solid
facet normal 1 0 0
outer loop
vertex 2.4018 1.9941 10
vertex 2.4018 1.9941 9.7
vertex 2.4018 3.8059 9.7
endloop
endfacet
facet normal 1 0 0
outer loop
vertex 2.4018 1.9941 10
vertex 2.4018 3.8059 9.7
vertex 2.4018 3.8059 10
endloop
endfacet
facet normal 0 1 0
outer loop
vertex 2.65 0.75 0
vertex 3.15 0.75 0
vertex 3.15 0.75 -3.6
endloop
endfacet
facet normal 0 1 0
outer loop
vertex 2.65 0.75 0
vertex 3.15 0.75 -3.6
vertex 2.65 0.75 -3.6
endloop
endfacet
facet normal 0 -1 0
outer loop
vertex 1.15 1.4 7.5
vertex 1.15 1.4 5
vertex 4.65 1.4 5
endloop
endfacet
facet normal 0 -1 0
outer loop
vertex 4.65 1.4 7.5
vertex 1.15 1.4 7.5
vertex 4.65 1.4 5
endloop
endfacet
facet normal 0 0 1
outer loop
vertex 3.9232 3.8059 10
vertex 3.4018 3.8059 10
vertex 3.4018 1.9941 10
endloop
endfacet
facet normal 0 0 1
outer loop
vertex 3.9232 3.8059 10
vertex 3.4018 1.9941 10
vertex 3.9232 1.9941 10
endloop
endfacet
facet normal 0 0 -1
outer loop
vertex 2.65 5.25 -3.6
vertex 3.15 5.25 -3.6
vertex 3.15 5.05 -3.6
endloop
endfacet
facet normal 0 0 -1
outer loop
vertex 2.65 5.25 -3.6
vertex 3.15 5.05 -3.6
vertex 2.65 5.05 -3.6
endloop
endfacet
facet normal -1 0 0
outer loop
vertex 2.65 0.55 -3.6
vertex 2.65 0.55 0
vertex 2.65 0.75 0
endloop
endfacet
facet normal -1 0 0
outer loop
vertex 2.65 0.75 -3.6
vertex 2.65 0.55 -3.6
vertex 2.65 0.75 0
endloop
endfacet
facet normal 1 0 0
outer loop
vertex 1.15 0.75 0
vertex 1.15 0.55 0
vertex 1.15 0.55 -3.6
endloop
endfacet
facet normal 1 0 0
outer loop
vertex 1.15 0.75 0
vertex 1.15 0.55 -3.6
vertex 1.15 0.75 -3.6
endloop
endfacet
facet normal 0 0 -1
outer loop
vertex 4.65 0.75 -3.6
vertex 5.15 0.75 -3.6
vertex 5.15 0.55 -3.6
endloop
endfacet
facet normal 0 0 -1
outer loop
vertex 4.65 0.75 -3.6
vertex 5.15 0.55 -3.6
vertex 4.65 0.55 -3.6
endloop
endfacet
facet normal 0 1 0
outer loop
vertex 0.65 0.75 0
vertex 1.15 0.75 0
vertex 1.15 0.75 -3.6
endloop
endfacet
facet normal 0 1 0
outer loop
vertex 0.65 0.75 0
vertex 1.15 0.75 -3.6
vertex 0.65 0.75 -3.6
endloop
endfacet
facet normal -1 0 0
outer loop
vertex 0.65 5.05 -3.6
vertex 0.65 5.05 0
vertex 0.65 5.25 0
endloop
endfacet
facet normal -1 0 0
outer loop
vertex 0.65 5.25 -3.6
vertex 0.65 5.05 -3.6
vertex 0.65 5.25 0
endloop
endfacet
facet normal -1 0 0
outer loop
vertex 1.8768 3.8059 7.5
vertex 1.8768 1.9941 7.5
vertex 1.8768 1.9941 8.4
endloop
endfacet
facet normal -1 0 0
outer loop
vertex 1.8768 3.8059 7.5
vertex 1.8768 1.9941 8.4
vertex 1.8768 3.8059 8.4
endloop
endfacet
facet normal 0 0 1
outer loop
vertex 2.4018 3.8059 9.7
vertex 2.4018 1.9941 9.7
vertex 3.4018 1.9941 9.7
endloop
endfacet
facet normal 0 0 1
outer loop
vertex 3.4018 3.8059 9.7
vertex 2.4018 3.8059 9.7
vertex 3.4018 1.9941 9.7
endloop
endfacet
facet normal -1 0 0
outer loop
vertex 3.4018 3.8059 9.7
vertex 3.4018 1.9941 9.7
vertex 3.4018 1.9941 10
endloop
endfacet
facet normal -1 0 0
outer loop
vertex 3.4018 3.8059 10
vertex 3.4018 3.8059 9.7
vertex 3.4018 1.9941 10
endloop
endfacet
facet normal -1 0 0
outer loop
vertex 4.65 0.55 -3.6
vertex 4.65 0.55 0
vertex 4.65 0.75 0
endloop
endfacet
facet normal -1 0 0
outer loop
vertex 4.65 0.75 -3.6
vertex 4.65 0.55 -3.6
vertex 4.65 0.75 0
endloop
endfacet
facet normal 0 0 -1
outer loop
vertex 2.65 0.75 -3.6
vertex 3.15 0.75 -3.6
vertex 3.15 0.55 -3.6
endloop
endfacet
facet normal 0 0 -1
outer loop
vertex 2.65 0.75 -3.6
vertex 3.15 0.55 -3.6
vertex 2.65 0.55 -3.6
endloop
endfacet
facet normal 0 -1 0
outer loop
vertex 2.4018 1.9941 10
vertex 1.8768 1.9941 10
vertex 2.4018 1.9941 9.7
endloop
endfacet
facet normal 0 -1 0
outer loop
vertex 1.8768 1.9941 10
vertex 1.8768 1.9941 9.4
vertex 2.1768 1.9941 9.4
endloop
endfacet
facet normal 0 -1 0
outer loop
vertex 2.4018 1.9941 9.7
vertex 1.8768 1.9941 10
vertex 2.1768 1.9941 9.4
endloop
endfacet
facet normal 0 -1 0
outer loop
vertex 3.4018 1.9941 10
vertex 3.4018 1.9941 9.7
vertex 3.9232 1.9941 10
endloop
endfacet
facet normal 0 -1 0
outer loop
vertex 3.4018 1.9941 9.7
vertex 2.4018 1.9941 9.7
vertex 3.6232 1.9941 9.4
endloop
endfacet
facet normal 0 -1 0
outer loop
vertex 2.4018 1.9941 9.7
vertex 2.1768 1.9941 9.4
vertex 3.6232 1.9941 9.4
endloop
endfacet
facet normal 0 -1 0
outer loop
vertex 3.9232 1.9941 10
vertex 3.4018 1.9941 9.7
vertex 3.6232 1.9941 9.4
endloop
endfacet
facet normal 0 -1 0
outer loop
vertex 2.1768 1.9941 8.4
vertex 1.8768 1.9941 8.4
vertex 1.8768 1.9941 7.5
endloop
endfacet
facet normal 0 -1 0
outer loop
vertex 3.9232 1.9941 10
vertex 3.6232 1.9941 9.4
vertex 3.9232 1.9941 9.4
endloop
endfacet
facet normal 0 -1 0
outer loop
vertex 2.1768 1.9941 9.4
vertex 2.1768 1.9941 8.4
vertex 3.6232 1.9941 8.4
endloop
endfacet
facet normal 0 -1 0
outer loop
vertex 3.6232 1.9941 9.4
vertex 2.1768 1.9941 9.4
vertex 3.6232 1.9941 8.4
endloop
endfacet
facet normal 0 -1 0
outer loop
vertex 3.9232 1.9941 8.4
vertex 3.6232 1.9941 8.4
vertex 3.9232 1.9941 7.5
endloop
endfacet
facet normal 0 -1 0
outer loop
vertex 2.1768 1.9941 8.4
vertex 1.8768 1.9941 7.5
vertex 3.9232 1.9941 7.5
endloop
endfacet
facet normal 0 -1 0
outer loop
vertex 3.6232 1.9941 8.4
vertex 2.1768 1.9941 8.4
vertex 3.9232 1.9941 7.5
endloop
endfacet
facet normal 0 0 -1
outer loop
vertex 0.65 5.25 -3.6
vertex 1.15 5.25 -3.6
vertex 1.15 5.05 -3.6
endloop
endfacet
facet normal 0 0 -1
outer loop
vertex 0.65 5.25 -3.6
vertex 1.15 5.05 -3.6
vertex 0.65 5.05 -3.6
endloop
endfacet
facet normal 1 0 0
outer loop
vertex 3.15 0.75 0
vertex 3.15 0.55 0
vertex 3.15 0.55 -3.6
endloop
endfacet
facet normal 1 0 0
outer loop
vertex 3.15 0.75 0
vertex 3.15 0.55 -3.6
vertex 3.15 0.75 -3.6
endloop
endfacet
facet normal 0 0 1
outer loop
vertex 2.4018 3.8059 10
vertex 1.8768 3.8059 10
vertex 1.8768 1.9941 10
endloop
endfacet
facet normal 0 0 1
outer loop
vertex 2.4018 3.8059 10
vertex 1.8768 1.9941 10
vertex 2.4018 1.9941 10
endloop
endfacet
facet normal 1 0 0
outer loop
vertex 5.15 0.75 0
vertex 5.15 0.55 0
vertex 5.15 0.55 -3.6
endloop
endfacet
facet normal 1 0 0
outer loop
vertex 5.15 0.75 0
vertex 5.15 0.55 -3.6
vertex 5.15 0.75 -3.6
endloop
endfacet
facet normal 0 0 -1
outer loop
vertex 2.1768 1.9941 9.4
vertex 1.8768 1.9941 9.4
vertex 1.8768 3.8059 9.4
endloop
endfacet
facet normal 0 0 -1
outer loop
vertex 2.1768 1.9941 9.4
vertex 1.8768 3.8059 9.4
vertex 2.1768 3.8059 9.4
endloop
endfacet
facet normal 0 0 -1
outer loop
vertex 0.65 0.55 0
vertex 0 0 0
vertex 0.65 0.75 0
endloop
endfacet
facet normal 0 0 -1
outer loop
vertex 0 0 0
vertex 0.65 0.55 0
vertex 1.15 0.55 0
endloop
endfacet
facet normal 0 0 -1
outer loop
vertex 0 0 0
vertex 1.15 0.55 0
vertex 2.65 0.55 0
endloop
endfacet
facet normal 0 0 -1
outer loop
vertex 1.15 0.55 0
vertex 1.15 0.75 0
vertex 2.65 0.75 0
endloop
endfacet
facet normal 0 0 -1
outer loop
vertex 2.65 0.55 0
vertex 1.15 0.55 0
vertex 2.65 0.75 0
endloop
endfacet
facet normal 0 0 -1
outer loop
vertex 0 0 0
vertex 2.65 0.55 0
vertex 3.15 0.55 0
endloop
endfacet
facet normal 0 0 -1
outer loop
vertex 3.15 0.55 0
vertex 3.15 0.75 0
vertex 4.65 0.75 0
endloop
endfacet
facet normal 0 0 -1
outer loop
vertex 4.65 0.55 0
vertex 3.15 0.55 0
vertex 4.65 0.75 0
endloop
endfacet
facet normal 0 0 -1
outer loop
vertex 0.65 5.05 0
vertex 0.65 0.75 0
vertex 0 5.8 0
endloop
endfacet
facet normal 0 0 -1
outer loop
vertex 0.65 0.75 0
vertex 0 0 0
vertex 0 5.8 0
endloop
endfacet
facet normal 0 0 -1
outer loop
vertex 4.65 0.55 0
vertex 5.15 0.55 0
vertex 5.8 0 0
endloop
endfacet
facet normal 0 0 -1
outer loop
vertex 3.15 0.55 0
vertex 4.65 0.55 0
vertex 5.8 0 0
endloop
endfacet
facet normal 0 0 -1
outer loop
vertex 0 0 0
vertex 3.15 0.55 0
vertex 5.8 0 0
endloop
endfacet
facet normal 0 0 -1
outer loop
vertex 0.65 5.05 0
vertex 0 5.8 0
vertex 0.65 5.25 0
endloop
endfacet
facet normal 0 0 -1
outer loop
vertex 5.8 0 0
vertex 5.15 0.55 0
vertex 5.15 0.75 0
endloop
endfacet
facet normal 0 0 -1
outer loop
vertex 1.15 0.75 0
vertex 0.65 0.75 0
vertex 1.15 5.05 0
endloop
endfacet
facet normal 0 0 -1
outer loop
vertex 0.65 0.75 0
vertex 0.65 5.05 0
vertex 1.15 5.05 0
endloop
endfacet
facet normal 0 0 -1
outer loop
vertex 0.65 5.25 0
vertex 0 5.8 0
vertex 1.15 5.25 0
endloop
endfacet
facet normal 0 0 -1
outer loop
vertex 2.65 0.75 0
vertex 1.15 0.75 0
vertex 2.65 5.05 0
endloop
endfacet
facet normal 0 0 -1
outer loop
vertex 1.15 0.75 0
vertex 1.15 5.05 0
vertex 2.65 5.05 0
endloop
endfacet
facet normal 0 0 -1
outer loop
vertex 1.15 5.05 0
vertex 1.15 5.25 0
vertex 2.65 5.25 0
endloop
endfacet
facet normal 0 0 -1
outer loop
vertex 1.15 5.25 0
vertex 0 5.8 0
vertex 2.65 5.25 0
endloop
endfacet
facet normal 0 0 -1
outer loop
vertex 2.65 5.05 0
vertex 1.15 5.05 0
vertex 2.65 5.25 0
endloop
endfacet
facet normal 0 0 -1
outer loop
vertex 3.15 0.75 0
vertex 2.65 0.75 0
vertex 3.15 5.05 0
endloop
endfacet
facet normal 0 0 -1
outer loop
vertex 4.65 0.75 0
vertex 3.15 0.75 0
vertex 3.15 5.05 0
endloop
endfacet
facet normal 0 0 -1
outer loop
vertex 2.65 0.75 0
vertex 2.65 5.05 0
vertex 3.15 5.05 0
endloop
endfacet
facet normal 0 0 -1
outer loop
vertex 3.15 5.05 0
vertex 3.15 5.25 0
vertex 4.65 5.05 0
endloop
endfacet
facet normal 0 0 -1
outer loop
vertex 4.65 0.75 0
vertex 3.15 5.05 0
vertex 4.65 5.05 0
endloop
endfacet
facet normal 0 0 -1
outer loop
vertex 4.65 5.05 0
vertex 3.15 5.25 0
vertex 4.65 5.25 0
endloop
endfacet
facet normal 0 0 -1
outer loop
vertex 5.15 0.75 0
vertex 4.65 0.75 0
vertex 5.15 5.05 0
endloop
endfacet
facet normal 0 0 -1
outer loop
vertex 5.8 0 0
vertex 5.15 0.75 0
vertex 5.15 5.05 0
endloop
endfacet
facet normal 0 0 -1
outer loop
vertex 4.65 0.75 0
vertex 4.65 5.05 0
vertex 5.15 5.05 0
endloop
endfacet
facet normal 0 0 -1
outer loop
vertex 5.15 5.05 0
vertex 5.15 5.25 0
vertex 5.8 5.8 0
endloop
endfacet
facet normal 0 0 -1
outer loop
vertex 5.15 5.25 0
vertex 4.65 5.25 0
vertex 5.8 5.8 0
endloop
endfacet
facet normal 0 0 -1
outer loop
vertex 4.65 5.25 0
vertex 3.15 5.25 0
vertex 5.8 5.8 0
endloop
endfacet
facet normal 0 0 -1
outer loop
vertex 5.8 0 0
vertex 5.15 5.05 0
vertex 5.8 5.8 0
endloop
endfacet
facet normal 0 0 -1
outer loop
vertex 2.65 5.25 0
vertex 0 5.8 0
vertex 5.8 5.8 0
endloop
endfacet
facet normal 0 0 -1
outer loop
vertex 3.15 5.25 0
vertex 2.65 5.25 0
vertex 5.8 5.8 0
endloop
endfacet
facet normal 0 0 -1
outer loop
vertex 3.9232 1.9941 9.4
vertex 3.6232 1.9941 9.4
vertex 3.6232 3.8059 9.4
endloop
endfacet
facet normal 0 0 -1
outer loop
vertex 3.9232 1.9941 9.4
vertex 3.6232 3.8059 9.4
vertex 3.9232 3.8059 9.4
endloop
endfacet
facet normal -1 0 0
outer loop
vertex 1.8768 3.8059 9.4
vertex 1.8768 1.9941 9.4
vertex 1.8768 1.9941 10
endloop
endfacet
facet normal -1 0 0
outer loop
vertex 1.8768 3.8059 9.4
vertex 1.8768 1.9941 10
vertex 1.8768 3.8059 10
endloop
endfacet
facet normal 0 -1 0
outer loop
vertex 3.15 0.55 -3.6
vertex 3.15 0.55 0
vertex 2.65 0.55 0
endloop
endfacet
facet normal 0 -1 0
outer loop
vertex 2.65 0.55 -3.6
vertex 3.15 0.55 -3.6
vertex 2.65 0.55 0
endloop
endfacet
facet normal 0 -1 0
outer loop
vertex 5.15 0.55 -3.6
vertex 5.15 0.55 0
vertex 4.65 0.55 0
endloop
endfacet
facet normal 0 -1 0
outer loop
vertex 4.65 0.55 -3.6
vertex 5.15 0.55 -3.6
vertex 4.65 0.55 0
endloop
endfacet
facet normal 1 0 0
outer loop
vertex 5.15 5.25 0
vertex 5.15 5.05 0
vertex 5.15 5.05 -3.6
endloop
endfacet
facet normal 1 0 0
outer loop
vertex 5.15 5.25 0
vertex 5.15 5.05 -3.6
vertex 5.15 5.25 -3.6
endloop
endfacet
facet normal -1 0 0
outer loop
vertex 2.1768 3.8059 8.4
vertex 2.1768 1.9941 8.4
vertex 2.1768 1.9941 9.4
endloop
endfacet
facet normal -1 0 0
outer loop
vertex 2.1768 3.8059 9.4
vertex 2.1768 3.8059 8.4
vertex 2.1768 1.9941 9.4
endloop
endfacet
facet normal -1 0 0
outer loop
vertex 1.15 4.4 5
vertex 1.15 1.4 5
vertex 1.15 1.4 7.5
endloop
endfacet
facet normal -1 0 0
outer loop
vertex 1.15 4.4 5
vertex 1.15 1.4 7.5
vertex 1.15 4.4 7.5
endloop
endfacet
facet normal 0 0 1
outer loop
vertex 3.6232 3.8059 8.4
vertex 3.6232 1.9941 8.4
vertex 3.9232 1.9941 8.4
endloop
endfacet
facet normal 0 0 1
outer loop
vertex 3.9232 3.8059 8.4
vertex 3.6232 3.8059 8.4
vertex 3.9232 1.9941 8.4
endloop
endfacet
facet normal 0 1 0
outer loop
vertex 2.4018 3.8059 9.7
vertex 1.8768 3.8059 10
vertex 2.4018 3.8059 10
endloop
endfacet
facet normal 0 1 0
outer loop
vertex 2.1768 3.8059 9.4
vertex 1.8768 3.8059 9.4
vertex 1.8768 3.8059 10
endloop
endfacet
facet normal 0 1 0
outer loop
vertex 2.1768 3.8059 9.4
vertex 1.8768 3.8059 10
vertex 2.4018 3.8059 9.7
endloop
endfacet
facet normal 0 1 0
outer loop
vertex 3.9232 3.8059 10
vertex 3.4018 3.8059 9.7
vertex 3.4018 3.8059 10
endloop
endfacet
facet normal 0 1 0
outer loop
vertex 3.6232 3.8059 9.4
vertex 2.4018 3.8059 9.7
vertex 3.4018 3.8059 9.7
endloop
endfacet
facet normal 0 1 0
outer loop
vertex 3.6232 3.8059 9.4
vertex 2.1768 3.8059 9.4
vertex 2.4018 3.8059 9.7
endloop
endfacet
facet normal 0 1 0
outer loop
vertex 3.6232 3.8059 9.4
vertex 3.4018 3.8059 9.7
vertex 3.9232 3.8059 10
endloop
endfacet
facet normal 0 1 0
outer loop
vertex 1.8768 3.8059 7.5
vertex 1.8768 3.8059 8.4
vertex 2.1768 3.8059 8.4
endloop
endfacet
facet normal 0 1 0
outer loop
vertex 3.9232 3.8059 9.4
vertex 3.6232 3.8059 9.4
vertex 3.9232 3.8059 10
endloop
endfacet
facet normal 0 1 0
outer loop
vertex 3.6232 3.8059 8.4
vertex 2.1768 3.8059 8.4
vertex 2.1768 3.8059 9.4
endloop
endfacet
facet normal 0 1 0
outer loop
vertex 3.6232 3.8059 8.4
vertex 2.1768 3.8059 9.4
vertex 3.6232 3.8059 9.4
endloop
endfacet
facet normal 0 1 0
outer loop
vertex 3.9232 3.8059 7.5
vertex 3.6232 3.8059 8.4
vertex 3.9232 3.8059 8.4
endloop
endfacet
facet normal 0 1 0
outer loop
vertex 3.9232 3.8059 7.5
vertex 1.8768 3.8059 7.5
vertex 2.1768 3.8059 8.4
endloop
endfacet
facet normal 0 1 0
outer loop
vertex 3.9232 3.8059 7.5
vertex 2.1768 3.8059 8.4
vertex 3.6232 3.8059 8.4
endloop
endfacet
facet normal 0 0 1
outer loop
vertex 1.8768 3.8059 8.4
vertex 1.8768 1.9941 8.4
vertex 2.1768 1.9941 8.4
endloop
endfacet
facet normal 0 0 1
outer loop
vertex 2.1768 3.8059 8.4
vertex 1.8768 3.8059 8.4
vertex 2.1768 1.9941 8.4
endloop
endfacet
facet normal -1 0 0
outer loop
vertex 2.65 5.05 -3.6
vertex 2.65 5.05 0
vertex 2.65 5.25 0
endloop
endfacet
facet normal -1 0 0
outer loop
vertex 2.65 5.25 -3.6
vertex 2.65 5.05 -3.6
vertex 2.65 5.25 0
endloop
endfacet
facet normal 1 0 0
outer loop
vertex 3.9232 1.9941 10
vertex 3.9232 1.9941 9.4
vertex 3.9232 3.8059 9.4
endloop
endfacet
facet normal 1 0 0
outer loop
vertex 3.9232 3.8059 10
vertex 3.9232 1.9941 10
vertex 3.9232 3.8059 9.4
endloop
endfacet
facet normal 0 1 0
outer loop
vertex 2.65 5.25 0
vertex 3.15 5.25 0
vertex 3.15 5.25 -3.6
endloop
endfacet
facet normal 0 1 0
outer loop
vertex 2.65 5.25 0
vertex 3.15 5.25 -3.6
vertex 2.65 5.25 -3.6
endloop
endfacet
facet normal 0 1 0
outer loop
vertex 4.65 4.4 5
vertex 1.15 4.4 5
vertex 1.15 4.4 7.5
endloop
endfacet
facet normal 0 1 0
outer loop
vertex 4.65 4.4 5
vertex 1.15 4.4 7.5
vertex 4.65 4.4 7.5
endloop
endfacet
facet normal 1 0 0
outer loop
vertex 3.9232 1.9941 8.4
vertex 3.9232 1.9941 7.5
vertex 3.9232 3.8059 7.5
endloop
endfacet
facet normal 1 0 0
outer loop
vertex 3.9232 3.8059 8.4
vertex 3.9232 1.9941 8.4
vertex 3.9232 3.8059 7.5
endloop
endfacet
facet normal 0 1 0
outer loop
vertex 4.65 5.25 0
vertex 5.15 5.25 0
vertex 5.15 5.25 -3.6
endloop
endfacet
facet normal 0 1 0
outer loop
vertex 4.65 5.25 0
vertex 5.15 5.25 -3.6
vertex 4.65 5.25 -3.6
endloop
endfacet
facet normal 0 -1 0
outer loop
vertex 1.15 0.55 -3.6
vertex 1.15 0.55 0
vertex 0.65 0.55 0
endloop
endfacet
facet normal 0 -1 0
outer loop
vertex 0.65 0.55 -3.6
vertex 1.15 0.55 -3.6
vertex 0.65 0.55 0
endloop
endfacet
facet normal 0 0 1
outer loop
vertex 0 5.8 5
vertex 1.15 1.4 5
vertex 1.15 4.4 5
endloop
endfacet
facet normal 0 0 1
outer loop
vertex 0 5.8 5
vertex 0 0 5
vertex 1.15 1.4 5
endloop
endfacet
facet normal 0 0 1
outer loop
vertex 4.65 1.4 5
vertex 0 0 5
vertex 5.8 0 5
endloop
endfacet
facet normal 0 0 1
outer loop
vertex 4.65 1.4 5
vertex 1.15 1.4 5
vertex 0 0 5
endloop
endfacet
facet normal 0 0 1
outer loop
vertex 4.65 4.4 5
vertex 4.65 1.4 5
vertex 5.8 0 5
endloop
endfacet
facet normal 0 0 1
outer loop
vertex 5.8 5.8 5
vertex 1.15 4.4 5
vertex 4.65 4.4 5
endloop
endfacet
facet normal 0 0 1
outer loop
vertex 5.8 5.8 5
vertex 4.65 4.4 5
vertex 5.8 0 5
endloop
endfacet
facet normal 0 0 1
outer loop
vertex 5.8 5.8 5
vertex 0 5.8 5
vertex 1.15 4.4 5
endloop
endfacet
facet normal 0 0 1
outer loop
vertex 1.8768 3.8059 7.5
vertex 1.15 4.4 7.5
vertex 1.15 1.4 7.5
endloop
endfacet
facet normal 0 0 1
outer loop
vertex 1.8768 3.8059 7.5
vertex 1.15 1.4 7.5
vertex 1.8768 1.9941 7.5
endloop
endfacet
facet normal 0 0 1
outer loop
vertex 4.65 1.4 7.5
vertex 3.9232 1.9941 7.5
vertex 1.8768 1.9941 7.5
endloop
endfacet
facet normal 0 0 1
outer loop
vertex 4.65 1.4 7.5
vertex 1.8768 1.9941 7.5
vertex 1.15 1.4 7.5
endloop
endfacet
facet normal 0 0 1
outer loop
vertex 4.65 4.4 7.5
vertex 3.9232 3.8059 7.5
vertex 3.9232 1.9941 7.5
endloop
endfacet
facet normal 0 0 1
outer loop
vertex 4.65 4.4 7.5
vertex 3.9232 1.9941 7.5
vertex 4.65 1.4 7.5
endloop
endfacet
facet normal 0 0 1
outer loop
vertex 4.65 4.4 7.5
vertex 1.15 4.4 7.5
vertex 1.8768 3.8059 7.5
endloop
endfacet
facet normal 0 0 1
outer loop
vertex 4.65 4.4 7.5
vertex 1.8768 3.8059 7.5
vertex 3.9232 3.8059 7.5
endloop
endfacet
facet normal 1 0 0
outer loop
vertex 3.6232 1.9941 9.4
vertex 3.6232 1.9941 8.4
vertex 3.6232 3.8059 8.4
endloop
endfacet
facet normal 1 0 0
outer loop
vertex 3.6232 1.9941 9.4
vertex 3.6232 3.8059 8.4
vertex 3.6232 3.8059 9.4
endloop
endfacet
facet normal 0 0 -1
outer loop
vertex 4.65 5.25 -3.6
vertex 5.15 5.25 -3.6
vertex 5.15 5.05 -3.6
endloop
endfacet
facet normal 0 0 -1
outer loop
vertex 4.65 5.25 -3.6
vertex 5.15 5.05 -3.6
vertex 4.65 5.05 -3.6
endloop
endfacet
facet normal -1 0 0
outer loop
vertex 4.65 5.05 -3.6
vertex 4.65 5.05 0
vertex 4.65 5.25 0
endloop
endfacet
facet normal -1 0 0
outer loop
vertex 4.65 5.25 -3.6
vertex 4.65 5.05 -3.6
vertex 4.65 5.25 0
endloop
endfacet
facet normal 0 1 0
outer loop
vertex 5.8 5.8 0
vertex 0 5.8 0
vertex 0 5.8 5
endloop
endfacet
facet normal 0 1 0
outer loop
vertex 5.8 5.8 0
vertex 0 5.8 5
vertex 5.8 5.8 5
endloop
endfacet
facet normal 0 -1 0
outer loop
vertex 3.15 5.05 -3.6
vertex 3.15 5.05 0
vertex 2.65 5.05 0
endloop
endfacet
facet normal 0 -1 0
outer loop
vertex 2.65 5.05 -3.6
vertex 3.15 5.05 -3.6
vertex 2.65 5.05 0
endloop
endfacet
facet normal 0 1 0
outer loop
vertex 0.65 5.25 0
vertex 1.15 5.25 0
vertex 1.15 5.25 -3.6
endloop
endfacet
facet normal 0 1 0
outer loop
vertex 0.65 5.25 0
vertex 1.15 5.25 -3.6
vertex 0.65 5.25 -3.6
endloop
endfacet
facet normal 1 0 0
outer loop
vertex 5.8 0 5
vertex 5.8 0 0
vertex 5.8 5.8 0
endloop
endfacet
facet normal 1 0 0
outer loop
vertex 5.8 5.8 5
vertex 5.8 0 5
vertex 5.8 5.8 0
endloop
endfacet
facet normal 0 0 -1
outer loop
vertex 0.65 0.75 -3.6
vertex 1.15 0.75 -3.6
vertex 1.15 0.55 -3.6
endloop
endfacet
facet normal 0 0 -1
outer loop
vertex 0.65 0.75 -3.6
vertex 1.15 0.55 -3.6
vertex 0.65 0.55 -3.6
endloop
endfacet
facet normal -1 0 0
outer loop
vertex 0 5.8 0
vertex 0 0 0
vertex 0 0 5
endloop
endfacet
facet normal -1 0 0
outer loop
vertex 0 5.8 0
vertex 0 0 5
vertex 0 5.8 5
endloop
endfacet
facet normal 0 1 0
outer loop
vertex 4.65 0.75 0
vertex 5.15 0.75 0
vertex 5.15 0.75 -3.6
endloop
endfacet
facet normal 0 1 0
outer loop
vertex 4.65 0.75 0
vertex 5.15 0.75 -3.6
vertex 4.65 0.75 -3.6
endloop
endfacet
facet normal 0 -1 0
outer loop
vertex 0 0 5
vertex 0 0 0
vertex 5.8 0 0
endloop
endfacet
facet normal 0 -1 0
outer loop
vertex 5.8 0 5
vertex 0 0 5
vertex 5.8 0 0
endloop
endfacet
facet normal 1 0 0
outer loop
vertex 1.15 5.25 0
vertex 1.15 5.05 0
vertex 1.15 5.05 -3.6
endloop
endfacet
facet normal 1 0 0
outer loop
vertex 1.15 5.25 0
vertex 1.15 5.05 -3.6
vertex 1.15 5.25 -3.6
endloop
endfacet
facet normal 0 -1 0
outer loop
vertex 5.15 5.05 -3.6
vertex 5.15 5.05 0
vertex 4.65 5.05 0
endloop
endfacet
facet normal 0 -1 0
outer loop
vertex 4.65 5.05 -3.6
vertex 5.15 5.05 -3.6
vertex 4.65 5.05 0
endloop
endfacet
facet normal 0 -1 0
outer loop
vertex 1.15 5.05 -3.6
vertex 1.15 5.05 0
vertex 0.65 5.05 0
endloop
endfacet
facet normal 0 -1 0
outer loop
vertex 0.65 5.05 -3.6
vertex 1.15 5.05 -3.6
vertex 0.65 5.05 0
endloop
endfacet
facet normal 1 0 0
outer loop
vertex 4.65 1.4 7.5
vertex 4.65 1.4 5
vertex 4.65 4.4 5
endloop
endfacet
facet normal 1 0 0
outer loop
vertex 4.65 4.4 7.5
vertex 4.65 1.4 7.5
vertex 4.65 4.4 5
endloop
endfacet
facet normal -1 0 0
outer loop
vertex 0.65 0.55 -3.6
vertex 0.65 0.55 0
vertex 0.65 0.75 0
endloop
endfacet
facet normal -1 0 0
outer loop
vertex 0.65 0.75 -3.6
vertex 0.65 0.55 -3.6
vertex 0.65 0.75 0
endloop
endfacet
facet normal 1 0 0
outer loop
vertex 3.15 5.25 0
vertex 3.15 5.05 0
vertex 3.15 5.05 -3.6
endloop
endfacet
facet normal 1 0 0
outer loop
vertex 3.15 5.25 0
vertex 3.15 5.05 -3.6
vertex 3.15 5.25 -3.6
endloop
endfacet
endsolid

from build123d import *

# Parameters (mm, degrees)
SKETCH1_W           = 5.8
SKETCH1_H           = 5.8
BOSS_EXTRUDE2_DEPTH = 5
SKETCH3_W           = 3.5
SKETCH3_H           = 3
BOSS_EXTRUDE3_DEPTH = 2.5
SKETCH4_W           = 2.046388996
SKETCH4_H           = 1.811822668
BOSS_EXTRUDE4_DEPTH = 2.5
SKETCH5_W           = 0.5
SKETCH5_H           = 0.2
BOSS_EXTRUDE5_DEPTH = 3.6
SKETCH6_W           = 1
SKETCH6_H           = 0.3
SKETCH6_W_2         = 0.3
SKETCH6_H_2         = 1
CUT_EXTRUDE1_DEPTH  = 2


with BuildPart() as part:
    # Sketch1 → Boss-Extrude2 (new body)
    with BuildSketch(Plane.XY):
        with Locations((2.9, 2.9)):
            Rectangle(SKETCH1_W, SKETCH1_H)
    extrude(amount=BOSS_EXTRUDE2_DEPTH)

    # Sketch3 → Boss-Extrude3 (add)
    with BuildSketch(Plane.XY.offset(5)):
        with Locations((2.9, 2.9)):
            Rectangle(SKETCH3_W, SKETCH3_H)
    extrude(amount=BOSS_EXTRUDE3_DEPTH)

    # Sketch4 → Boss-Extrude4 (add)
    with BuildSketch(Plane.XY.offset(7.5)):
        with Locations((2.9, 2.9)):
            Rectangle(SKETCH4_W, SKETCH4_H)
    extrude(amount=BOSS_EXTRUDE4_DEPTH)

    # Sketch5 → Boss-Extrude5 (add)
    with BuildSketch(Plane(origin=(0, 0, 0), x_dir=(-1, 0, 0), z_dir=(0, 0, -1))):
        with Locations((-4.9, 5.15)):
            Rectangle(SKETCH5_W, SKETCH5_H)
        with Locations((-2.9, 5.15)):
            Rectangle(SKETCH5_W, SKETCH5_H)
        with Locations((-0.9, 5.15)):
            Rectangle(SKETCH5_W, SKETCH5_H)
        with Locations((-0.9, 0.65)):
            Rectangle(SKETCH5_W, SKETCH5_H)
        with Locations((-2.9, 0.65)):
            Rectangle(SKETCH5_W, SKETCH5_H)
        with Locations((-4.9, 0.65)):
            Rectangle(SKETCH5_W, SKETCH5_H)
    extrude(amount=BOSS_EXTRUDE5_DEPTH)

    # Sketch6 → Cut-Extrude1 (cut)
    with BuildSketch(Plane.XZ.offset(-1.994088666)):
        with Locations((2.901805502, 9.85)):
            Rectangle(SKETCH6_W, SKETCH6_H)
        with Locations((2.026805502, 8.9)):
            Rectangle(SKETCH6_W_2, SKETCH6_H_2)
        with Locations((3.773194498, 8.9)):
            Rectangle(SKETCH6_W_2, SKETCH6_H_2)
    extrude(amount=-CUT_EXTRUDE1_DEPTH, mode=Mode.SUBTRACT)


solid = part.part
